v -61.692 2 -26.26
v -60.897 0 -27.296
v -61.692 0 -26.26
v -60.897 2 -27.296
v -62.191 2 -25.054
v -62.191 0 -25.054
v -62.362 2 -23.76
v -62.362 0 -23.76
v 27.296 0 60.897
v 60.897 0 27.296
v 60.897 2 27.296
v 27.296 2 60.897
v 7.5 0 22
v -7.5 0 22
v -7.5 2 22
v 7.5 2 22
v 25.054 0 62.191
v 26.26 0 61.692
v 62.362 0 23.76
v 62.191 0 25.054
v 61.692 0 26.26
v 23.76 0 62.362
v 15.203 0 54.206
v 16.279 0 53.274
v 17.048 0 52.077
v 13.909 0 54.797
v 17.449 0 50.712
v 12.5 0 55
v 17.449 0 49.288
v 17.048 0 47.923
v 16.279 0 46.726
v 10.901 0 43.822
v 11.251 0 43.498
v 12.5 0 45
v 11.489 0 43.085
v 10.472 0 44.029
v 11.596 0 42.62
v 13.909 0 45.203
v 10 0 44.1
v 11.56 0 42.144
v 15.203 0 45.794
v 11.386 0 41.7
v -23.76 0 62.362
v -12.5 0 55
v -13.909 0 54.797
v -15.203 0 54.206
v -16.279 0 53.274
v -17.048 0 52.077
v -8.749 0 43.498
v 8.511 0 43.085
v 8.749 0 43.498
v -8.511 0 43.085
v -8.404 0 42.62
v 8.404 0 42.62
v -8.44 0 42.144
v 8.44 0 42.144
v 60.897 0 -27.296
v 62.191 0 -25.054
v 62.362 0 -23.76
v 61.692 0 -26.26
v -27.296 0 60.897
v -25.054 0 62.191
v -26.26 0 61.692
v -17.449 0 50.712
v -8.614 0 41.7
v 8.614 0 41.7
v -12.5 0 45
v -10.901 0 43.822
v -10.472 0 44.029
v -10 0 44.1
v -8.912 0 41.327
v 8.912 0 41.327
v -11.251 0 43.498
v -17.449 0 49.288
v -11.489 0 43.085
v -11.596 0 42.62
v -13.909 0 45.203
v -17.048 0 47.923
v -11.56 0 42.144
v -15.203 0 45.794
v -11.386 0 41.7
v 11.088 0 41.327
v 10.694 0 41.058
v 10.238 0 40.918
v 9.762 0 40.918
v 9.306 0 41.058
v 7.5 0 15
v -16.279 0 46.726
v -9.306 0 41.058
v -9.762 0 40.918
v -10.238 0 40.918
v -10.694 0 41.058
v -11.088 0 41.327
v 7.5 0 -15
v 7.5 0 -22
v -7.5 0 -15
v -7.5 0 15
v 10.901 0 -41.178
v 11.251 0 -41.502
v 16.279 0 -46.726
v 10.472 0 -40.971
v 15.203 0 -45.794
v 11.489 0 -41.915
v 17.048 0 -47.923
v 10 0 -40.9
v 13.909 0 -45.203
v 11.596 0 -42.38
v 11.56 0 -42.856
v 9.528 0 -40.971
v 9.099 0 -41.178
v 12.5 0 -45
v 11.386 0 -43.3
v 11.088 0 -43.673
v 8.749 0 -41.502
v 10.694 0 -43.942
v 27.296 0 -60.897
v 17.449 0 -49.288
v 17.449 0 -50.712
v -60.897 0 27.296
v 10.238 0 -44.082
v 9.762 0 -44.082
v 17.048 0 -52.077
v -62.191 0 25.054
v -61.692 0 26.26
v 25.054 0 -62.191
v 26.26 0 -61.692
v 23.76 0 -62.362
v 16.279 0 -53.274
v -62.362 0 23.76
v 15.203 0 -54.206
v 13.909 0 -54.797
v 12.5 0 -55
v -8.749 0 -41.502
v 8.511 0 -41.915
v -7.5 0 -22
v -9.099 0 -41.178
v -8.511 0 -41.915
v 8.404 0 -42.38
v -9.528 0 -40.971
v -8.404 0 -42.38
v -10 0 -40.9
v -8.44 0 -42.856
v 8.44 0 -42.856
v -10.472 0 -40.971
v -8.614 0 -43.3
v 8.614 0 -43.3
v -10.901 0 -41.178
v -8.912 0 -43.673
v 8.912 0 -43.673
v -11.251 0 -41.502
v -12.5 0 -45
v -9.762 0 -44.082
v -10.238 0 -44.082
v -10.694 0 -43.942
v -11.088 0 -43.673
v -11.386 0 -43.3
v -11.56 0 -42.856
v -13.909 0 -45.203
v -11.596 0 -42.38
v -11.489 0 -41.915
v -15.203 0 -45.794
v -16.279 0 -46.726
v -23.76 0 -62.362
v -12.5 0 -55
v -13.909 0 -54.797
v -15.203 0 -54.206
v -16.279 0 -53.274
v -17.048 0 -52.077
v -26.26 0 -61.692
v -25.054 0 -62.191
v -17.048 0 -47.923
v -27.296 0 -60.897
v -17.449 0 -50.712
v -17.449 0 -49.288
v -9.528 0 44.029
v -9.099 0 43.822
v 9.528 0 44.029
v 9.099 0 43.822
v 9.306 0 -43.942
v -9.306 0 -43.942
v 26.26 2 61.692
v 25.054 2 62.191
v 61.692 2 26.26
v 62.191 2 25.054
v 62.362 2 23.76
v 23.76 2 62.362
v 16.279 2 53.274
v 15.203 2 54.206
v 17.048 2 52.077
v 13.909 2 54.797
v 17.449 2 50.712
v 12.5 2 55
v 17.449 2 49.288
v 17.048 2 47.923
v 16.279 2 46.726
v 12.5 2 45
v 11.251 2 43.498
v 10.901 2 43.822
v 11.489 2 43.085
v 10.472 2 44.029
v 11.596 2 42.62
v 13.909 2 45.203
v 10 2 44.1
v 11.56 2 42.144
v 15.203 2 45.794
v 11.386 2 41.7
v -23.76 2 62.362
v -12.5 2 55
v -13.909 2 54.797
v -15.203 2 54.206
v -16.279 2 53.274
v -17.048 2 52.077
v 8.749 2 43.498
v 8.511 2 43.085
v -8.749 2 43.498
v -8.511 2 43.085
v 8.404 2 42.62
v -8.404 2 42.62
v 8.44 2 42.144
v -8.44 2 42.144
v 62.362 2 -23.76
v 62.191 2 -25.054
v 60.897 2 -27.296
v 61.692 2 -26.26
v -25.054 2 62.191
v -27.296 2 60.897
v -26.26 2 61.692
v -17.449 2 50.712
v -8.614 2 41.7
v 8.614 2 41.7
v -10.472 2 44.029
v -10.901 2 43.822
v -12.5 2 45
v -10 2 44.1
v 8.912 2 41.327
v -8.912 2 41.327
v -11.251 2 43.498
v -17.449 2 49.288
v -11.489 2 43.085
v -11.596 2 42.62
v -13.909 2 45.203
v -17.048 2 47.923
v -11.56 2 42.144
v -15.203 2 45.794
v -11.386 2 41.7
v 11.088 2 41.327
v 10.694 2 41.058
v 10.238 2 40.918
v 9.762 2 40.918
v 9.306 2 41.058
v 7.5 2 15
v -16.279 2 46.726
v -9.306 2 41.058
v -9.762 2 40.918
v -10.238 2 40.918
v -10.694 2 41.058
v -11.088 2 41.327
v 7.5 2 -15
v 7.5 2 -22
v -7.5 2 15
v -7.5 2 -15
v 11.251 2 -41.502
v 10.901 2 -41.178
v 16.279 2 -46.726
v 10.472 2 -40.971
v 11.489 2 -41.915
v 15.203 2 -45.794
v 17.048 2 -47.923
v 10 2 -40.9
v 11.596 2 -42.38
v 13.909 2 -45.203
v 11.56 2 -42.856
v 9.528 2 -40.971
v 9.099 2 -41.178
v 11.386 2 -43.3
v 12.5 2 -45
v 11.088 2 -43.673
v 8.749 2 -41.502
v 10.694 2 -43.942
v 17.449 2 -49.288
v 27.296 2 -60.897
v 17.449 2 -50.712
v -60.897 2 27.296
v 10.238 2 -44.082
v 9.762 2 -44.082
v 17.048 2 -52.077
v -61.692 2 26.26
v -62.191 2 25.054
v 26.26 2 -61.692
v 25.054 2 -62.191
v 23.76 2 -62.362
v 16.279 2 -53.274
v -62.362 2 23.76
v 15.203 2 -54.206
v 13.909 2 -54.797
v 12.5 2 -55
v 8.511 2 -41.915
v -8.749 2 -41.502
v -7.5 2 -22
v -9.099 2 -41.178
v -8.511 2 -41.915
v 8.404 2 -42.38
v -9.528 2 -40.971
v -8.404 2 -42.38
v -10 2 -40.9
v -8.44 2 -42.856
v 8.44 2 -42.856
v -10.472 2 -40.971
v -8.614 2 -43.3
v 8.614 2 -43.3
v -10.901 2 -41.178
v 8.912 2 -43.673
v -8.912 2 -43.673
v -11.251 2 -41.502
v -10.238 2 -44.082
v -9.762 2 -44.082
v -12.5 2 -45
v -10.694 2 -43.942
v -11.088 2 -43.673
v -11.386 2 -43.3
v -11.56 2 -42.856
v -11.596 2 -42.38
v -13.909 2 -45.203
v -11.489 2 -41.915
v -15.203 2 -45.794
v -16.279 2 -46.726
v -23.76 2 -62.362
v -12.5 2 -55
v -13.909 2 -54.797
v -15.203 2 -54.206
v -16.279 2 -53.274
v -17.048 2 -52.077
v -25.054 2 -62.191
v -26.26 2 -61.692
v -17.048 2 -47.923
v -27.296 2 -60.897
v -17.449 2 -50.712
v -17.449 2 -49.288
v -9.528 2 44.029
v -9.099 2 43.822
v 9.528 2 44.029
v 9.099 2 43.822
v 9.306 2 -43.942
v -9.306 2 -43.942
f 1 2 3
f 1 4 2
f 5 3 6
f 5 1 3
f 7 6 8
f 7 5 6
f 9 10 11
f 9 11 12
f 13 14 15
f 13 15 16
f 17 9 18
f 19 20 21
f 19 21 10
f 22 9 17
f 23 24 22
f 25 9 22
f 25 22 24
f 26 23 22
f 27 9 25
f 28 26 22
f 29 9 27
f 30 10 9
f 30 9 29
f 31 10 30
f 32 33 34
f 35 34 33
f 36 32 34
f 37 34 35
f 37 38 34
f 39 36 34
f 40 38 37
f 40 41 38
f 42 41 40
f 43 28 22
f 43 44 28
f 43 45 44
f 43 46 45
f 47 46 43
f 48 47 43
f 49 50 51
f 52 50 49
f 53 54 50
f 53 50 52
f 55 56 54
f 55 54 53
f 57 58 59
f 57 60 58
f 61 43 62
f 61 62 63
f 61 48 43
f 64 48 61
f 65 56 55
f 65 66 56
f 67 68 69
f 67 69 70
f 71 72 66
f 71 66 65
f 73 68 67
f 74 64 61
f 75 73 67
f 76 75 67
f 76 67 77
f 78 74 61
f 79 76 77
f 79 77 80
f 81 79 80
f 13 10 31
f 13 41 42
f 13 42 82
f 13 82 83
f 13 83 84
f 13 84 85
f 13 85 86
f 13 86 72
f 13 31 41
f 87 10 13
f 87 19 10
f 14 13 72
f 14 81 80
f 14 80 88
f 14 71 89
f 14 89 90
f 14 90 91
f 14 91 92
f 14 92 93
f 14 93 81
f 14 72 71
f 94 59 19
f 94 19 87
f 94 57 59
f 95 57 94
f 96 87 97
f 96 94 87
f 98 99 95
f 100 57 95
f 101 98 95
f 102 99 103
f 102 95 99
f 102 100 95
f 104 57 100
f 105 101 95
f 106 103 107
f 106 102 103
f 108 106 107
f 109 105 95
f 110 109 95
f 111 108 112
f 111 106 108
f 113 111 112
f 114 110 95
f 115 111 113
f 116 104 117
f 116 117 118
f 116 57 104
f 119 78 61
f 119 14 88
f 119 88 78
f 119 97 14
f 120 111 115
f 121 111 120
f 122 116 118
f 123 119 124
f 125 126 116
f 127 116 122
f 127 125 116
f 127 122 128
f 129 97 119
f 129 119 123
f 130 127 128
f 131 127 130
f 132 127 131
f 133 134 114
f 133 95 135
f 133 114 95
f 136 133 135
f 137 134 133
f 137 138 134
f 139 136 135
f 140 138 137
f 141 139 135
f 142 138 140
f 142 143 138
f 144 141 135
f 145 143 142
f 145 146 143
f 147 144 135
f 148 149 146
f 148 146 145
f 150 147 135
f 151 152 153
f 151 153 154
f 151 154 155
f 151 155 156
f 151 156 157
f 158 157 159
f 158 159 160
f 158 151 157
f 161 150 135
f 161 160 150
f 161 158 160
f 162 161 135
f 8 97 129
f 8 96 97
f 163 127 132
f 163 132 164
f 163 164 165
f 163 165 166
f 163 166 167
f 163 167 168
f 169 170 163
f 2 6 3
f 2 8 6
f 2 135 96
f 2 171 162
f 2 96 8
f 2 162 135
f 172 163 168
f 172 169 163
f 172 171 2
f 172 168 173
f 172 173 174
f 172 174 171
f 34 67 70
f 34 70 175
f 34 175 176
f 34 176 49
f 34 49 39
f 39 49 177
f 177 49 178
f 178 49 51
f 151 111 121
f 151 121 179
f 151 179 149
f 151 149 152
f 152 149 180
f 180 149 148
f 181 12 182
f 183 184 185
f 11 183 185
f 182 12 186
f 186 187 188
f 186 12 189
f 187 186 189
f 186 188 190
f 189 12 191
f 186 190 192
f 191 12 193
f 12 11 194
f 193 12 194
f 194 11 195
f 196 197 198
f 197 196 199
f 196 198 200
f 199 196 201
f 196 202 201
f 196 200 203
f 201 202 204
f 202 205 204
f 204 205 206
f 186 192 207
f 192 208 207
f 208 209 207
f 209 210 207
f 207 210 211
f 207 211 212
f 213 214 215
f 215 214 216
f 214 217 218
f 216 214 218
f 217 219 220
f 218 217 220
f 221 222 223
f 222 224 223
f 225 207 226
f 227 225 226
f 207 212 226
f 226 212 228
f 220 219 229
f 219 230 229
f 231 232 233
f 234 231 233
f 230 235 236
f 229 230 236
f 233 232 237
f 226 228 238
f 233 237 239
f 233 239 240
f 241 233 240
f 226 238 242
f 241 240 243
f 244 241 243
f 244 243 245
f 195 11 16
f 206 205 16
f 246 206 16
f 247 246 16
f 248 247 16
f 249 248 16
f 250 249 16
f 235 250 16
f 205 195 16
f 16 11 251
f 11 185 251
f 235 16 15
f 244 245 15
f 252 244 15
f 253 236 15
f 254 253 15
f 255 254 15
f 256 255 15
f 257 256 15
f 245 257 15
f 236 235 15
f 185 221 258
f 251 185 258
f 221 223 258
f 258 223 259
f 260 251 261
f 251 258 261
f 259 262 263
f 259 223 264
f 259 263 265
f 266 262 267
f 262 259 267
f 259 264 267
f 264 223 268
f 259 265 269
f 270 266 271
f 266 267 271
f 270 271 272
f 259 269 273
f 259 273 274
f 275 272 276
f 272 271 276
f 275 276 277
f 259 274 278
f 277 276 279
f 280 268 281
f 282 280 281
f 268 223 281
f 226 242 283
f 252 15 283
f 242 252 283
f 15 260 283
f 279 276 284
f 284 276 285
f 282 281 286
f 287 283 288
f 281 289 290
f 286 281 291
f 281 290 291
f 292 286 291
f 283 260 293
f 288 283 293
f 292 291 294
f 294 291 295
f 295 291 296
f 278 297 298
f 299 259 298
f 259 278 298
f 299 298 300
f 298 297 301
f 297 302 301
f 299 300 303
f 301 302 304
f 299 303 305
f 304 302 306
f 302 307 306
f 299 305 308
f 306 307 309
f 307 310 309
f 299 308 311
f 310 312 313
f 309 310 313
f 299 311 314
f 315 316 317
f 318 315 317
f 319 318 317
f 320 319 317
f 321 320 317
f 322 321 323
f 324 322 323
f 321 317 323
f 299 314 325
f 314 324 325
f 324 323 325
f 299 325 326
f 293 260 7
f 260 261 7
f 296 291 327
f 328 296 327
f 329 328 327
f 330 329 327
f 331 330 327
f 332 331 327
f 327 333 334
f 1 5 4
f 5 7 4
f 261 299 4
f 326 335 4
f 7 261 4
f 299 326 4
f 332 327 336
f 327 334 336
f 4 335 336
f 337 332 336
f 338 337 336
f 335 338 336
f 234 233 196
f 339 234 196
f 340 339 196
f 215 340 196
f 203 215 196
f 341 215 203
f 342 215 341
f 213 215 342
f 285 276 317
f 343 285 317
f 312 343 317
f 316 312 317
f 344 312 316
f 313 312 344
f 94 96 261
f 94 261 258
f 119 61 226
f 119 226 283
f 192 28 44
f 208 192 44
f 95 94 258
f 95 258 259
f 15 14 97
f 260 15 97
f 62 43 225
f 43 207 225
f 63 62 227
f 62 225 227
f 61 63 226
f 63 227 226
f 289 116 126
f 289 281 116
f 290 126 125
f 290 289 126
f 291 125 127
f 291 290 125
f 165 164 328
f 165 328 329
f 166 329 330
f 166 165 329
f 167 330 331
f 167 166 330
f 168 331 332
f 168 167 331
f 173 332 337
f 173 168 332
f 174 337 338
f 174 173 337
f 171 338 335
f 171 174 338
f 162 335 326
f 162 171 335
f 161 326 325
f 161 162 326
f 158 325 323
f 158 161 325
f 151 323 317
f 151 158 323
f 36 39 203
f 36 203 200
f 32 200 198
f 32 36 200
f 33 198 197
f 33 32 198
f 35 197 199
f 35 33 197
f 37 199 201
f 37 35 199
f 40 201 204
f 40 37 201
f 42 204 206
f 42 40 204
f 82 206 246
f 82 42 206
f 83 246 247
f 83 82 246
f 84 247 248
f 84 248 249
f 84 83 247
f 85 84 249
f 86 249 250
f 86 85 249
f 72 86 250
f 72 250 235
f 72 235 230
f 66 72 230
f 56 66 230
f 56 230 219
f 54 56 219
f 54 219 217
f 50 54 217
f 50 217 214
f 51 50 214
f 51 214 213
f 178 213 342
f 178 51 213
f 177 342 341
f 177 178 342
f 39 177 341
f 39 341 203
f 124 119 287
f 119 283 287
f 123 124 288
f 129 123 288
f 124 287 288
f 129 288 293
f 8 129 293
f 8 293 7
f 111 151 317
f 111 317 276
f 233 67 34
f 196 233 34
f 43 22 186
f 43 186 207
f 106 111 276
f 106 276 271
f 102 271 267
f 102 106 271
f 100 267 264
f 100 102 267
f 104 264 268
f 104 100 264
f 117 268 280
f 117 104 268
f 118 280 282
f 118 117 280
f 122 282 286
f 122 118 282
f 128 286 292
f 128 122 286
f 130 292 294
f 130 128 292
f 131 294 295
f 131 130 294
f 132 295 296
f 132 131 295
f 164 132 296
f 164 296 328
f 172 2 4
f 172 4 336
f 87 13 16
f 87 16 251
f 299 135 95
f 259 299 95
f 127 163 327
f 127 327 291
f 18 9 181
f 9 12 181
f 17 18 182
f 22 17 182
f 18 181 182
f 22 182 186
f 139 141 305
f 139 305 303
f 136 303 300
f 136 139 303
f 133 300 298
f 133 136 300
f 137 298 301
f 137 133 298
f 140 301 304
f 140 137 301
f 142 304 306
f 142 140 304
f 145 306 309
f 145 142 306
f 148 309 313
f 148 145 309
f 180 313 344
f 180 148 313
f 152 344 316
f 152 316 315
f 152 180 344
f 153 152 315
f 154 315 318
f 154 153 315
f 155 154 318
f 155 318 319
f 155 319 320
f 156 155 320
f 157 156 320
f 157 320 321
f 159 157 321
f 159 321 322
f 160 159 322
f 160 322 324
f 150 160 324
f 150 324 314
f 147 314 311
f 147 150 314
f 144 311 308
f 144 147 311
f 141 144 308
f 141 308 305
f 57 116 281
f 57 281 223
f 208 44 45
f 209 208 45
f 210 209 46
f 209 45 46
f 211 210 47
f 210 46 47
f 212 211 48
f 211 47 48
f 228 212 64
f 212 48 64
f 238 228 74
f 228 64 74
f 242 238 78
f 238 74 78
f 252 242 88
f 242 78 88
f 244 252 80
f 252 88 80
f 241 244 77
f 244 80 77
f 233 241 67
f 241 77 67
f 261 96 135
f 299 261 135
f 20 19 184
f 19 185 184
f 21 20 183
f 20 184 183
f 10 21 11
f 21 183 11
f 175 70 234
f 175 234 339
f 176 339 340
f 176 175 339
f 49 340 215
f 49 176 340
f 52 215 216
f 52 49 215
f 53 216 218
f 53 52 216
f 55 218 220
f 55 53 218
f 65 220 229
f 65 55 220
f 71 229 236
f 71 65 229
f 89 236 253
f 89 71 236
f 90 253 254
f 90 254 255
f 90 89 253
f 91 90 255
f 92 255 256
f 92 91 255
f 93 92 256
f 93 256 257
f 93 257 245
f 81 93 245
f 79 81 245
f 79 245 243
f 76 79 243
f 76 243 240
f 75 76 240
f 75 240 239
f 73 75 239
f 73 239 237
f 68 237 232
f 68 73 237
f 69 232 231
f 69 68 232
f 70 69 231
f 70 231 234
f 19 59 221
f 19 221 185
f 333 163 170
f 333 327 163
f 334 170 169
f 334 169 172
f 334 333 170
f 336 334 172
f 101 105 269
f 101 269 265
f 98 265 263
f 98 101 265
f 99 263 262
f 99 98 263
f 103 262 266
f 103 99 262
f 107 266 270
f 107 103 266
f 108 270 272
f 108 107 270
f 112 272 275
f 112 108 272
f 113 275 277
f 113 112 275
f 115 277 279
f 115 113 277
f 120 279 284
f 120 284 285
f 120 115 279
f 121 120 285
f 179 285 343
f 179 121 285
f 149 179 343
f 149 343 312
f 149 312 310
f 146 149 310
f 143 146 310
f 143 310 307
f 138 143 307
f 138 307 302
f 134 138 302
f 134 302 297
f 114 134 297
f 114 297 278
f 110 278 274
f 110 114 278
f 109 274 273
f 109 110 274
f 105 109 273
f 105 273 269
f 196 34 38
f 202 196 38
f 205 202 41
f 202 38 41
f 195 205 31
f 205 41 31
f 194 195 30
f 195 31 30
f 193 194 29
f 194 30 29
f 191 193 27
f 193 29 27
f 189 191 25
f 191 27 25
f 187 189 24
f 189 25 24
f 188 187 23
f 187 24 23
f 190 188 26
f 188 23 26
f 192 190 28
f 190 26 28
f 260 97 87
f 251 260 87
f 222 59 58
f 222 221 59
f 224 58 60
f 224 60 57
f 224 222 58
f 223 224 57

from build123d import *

# Parameters (mm, degrees)
SKETCH1_R           = 1.6
SKETCH1_W           = 15
SKETCH1_H           = 7
BOSS_EXTRUDE1_DEPTH = 2
FILLET1_R           = 5


with BuildPart() as part:
    # Sketch1 → Boss-Extrude1 (new body)
    with BuildSketch(Plane(origin=(0, 0, 0), x_dir=(1, 0, 0), z_dir=(0, 1, 0))):
        Polygon((62.361868445, 25.831131685), (62.361868445, -25.831131685), (25.831131685, -62.361868445), (-25.831131685, -62.361868445), (-62.361868445, -25.831131685), (-62.361868445, 25.831131685), (-25.831131685, 62.361868445), (25.831131685, 62.361868445), align=None)
        with Locations(Location((10, -42.5, 0), (0, 0, 270))):
            Circle(SKETCH1_R, mode=Mode.SUBTRACT)
        with Locations(Location((-10, -42.5, 0), (0, 0, 270))):
            Circle(SKETCH1_R, mode=Mode.SUBTRACT)
        with Locations(Location((-10, 42.5, 0), (0, 0, 270))):
            Circle(SKETCH1_R, mode=Mode.SUBTRACT)
        with Locations(Location((10, 42.5, 0), (0, 0, 270))):
            Circle(SKETCH1_R, mode=Mode.SUBTRACT)
        with BuildLine():
            Line((12.5, -55), (-12.5, -55))
            ThreePointArc((-12.5, -55), (-17.5, -50), (-12.5, -45))
            Line((-12.5, -45), (12.5, -45))
            ThreePointArc((12.5, -45), (17.5, -50), (12.5, -55))
        make_face(mode=Mode.SUBTRACT)
        with BuildLine():
            Line((12.5, 55), (-12.5, 55))
            ThreePointArc((-12.5, 55), (-17.5, 50), (-12.5, 45))
            Line((-12.5, 45), (12.5, 45))
            ThreePointArc((12.5, 45), (17.5, 50), (12.5, 55))
        make_face(mode=Mode.SUBTRACT)
        with Locations((0, -18.5)):
            Rectangle(SKETCH1_W, SKETCH1_H, mode=Mode.SUBTRACT)
        with Locations((0, 18.5)):
            Rectangle(SKETCH1_W, SKETCH1_H, mode=Mode.SUBTRACT)
    extrude(amount=BOSS_EXTRUDE1_DEPTH)

    # Fillet1
    fillet1_edges = [part.edges().sort_by_distance(p)[0] for p in [
        (-62.361868445, 1, -25.831131685),
        (-25.831131685, 1, -62.361868445),
        (25.831131685, 1, -62.361868445),
        (62.361868445, 1, -25.831131685),
        (62.361868445, 1, 25.831131685),
        (25.831131685, 1, 62.361868445),
        (-25.831131685, 1, 62.361868445),
        (-62.361868445, 1, 25.831131685),
    ]]
    fillet(fillet1_edges, radius=FILLET1_R)


solid = part.part
